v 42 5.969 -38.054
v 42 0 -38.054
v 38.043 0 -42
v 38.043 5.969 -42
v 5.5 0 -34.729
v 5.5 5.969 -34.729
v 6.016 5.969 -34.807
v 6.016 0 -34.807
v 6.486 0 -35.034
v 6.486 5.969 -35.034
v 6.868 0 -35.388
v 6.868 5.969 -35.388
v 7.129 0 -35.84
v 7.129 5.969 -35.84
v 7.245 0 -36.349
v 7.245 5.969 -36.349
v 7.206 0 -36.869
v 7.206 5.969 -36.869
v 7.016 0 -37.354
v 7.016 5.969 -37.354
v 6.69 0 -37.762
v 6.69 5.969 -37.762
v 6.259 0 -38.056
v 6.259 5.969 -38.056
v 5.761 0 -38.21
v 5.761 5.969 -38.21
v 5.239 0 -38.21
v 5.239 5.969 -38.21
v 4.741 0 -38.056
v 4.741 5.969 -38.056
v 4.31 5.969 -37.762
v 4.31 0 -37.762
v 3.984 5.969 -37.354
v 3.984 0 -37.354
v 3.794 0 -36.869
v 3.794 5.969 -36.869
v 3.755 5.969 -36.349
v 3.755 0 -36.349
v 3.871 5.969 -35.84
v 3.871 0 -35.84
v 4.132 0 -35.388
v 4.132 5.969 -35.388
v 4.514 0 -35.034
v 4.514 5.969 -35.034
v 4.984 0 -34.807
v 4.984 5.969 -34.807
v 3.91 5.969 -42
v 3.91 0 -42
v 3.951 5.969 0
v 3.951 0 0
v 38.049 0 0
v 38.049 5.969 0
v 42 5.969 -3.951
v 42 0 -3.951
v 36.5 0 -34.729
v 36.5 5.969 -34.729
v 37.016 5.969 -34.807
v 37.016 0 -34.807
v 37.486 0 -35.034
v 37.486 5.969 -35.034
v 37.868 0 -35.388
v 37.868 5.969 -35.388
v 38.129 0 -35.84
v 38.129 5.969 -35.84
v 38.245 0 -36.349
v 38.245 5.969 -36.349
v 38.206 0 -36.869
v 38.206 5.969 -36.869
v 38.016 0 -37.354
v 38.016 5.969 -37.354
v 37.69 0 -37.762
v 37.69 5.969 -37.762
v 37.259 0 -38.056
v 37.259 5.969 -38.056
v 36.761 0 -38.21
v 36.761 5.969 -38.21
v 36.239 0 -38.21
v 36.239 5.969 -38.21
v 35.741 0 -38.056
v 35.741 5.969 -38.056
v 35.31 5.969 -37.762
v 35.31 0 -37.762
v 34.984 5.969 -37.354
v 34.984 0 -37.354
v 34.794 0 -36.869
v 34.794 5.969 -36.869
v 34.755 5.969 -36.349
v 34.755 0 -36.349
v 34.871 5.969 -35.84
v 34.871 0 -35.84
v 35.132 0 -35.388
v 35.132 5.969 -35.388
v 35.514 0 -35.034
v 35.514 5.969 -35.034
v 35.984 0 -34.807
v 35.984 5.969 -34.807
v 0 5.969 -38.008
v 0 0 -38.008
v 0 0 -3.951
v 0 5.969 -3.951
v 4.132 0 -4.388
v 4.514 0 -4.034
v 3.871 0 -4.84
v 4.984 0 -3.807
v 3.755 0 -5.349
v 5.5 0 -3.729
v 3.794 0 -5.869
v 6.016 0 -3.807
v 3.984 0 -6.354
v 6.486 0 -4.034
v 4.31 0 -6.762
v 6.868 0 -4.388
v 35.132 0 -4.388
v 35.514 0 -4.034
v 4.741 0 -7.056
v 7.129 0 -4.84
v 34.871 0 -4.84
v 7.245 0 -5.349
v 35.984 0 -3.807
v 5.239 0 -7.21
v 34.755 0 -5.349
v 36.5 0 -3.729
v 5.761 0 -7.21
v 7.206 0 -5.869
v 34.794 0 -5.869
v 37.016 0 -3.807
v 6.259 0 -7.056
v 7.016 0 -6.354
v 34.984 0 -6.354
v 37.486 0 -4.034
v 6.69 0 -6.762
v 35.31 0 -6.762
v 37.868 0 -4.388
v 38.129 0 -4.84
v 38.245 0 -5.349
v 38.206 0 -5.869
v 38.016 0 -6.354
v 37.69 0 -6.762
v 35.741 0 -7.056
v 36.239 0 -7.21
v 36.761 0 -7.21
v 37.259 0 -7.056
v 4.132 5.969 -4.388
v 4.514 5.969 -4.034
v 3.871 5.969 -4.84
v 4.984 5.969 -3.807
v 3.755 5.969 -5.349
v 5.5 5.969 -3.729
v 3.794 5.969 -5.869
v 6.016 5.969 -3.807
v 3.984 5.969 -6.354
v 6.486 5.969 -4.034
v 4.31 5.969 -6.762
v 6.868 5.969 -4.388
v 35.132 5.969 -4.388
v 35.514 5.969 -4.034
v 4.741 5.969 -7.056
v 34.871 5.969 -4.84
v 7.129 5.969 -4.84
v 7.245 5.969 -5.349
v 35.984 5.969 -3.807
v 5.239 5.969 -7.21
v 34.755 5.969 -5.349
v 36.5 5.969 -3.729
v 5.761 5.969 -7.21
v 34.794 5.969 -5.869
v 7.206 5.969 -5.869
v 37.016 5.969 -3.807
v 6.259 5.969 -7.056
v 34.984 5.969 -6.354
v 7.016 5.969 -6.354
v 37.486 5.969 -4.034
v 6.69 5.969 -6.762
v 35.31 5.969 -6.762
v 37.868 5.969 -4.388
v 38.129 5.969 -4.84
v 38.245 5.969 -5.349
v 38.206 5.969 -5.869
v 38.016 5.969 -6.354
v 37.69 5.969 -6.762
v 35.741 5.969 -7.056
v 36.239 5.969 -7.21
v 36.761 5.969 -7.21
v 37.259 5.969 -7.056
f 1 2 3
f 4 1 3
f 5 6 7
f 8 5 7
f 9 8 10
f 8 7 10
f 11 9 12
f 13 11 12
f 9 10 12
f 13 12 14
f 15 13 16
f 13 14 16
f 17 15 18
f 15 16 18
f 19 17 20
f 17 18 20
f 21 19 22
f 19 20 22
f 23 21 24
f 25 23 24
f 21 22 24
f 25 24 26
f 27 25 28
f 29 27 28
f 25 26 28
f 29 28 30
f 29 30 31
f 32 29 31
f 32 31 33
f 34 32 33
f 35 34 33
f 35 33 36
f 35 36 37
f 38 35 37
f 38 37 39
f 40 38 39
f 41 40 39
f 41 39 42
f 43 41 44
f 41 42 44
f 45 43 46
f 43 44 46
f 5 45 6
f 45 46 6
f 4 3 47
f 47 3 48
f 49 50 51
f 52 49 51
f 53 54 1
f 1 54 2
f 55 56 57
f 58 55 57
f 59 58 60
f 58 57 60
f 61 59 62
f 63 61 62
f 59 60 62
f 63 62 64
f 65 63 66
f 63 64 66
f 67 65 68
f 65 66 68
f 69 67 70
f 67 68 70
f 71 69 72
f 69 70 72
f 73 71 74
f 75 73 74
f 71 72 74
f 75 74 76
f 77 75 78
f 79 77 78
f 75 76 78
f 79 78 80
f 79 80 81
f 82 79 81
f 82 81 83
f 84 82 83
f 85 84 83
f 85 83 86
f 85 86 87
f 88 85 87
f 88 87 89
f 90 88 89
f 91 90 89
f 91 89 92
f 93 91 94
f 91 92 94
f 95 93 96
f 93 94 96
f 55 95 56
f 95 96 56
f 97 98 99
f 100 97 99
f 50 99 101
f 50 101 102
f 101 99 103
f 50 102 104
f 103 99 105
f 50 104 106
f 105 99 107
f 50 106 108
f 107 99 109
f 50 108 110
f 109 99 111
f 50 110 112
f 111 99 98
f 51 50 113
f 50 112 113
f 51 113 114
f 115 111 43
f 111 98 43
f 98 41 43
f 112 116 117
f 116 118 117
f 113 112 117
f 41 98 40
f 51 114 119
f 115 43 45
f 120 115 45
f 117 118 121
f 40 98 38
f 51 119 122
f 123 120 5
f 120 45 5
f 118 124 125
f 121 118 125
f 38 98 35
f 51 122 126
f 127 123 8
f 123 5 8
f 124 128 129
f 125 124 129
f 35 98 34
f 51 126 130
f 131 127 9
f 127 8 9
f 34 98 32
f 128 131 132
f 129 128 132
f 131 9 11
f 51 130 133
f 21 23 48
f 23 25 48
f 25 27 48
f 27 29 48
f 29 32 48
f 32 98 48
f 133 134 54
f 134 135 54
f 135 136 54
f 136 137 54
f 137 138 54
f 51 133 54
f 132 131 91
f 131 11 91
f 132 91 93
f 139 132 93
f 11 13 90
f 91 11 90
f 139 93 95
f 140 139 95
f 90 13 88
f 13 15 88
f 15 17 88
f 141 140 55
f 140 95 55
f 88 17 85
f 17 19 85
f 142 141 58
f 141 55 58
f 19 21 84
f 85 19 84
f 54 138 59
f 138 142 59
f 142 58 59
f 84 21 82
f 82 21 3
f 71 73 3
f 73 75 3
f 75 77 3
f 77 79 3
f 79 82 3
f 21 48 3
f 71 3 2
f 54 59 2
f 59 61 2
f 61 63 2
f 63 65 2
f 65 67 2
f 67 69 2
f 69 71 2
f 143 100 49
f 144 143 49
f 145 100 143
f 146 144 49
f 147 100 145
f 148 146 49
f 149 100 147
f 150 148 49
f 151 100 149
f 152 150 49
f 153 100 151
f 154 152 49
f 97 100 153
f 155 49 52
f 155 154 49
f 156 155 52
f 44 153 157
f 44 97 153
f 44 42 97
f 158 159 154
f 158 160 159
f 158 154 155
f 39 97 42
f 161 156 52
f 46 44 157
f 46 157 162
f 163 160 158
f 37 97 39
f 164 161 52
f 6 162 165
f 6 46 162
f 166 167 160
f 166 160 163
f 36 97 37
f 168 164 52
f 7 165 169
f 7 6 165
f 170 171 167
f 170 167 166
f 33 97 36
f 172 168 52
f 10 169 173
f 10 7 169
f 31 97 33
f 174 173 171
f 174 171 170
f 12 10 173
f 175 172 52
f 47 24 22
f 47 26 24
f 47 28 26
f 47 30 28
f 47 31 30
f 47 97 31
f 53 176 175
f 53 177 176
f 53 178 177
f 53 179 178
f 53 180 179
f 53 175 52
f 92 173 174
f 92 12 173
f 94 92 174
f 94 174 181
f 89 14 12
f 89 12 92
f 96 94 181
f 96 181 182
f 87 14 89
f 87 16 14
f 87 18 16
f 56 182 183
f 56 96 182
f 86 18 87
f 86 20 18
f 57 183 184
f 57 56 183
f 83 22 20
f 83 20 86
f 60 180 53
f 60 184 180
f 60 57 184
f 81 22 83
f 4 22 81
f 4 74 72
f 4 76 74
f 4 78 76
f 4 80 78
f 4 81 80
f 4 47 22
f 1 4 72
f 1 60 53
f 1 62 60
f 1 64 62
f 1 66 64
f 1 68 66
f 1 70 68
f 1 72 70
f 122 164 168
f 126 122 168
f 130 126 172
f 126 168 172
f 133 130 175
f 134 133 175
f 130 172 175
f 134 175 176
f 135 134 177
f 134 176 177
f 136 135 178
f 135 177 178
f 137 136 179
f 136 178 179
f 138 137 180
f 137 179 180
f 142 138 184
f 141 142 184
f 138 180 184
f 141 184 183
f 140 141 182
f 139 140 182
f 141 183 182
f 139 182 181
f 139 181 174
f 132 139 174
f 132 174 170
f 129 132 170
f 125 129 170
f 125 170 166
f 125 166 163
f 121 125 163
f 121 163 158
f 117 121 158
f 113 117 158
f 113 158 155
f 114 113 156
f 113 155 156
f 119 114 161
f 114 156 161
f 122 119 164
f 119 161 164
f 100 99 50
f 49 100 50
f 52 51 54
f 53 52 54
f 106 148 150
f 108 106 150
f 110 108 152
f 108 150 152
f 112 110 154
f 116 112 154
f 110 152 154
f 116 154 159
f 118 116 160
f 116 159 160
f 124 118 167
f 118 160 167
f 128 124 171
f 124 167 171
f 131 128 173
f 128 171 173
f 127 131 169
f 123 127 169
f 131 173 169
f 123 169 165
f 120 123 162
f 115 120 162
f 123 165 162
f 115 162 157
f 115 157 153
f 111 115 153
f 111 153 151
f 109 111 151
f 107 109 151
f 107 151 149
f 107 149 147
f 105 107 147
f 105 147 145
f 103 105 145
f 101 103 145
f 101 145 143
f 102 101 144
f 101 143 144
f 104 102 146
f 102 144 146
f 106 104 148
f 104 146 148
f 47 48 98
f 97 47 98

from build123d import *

# Parameters (mm, degrees)
BOSS_EXTRUDE1_DEPTH = 5.969
SKETCH2_R           = 1.75
SKETCH2_R_2         = 1.750000056
CUT_EXTRUDE1_DEPTH  = 5.969


with BuildPart() as part:
    # Sketch1 → Boss-Extrude1 (new body)
    with BuildSketch(Plane(origin=(0, 0, 0), x_dir=(1, 0, 0), z_dir=(0, 1, 0))):
        Polygon((3.909848904, 42), (0, 38.007654129), (0, 3.951224), (3.951224, 0), (38.048776, 0), (42, 3.951224), (42, 38.054127921), (38.043254173, 42), align=None)
    extrude(amount=BOSS_EXTRUDE1_DEPTH)

    # Sketch2 → Cut-Extrude1 (cut)
    with BuildSketch(Plane(origin=(0, 5.969, 0), x_dir=(1, 0, 0), z_dir=(0, 1, 0))):
        with Locations(Location((5.5, 36.479439065, 0), (0, 0, 270))):
            Circle(SKETCH2_R)
        with Locations(Location((36.5, 36.479439065, 0), (0, 0, 270))):
            Circle(SKETCH2_R_2)
        with Locations(Location((36.5, 5.479439065, 0), (0, 0, 270))):
            Circle(SKETCH2_R_2)
        with Locations(Location((5.5, 5.479439065, 0), (0, 0, 270))):
            Circle(SKETCH2_R_2)
    extrude(amount=-CUT_EXTRUDE1_DEPTH, mode=Mode.SUBTRACT)


solid = part.part
